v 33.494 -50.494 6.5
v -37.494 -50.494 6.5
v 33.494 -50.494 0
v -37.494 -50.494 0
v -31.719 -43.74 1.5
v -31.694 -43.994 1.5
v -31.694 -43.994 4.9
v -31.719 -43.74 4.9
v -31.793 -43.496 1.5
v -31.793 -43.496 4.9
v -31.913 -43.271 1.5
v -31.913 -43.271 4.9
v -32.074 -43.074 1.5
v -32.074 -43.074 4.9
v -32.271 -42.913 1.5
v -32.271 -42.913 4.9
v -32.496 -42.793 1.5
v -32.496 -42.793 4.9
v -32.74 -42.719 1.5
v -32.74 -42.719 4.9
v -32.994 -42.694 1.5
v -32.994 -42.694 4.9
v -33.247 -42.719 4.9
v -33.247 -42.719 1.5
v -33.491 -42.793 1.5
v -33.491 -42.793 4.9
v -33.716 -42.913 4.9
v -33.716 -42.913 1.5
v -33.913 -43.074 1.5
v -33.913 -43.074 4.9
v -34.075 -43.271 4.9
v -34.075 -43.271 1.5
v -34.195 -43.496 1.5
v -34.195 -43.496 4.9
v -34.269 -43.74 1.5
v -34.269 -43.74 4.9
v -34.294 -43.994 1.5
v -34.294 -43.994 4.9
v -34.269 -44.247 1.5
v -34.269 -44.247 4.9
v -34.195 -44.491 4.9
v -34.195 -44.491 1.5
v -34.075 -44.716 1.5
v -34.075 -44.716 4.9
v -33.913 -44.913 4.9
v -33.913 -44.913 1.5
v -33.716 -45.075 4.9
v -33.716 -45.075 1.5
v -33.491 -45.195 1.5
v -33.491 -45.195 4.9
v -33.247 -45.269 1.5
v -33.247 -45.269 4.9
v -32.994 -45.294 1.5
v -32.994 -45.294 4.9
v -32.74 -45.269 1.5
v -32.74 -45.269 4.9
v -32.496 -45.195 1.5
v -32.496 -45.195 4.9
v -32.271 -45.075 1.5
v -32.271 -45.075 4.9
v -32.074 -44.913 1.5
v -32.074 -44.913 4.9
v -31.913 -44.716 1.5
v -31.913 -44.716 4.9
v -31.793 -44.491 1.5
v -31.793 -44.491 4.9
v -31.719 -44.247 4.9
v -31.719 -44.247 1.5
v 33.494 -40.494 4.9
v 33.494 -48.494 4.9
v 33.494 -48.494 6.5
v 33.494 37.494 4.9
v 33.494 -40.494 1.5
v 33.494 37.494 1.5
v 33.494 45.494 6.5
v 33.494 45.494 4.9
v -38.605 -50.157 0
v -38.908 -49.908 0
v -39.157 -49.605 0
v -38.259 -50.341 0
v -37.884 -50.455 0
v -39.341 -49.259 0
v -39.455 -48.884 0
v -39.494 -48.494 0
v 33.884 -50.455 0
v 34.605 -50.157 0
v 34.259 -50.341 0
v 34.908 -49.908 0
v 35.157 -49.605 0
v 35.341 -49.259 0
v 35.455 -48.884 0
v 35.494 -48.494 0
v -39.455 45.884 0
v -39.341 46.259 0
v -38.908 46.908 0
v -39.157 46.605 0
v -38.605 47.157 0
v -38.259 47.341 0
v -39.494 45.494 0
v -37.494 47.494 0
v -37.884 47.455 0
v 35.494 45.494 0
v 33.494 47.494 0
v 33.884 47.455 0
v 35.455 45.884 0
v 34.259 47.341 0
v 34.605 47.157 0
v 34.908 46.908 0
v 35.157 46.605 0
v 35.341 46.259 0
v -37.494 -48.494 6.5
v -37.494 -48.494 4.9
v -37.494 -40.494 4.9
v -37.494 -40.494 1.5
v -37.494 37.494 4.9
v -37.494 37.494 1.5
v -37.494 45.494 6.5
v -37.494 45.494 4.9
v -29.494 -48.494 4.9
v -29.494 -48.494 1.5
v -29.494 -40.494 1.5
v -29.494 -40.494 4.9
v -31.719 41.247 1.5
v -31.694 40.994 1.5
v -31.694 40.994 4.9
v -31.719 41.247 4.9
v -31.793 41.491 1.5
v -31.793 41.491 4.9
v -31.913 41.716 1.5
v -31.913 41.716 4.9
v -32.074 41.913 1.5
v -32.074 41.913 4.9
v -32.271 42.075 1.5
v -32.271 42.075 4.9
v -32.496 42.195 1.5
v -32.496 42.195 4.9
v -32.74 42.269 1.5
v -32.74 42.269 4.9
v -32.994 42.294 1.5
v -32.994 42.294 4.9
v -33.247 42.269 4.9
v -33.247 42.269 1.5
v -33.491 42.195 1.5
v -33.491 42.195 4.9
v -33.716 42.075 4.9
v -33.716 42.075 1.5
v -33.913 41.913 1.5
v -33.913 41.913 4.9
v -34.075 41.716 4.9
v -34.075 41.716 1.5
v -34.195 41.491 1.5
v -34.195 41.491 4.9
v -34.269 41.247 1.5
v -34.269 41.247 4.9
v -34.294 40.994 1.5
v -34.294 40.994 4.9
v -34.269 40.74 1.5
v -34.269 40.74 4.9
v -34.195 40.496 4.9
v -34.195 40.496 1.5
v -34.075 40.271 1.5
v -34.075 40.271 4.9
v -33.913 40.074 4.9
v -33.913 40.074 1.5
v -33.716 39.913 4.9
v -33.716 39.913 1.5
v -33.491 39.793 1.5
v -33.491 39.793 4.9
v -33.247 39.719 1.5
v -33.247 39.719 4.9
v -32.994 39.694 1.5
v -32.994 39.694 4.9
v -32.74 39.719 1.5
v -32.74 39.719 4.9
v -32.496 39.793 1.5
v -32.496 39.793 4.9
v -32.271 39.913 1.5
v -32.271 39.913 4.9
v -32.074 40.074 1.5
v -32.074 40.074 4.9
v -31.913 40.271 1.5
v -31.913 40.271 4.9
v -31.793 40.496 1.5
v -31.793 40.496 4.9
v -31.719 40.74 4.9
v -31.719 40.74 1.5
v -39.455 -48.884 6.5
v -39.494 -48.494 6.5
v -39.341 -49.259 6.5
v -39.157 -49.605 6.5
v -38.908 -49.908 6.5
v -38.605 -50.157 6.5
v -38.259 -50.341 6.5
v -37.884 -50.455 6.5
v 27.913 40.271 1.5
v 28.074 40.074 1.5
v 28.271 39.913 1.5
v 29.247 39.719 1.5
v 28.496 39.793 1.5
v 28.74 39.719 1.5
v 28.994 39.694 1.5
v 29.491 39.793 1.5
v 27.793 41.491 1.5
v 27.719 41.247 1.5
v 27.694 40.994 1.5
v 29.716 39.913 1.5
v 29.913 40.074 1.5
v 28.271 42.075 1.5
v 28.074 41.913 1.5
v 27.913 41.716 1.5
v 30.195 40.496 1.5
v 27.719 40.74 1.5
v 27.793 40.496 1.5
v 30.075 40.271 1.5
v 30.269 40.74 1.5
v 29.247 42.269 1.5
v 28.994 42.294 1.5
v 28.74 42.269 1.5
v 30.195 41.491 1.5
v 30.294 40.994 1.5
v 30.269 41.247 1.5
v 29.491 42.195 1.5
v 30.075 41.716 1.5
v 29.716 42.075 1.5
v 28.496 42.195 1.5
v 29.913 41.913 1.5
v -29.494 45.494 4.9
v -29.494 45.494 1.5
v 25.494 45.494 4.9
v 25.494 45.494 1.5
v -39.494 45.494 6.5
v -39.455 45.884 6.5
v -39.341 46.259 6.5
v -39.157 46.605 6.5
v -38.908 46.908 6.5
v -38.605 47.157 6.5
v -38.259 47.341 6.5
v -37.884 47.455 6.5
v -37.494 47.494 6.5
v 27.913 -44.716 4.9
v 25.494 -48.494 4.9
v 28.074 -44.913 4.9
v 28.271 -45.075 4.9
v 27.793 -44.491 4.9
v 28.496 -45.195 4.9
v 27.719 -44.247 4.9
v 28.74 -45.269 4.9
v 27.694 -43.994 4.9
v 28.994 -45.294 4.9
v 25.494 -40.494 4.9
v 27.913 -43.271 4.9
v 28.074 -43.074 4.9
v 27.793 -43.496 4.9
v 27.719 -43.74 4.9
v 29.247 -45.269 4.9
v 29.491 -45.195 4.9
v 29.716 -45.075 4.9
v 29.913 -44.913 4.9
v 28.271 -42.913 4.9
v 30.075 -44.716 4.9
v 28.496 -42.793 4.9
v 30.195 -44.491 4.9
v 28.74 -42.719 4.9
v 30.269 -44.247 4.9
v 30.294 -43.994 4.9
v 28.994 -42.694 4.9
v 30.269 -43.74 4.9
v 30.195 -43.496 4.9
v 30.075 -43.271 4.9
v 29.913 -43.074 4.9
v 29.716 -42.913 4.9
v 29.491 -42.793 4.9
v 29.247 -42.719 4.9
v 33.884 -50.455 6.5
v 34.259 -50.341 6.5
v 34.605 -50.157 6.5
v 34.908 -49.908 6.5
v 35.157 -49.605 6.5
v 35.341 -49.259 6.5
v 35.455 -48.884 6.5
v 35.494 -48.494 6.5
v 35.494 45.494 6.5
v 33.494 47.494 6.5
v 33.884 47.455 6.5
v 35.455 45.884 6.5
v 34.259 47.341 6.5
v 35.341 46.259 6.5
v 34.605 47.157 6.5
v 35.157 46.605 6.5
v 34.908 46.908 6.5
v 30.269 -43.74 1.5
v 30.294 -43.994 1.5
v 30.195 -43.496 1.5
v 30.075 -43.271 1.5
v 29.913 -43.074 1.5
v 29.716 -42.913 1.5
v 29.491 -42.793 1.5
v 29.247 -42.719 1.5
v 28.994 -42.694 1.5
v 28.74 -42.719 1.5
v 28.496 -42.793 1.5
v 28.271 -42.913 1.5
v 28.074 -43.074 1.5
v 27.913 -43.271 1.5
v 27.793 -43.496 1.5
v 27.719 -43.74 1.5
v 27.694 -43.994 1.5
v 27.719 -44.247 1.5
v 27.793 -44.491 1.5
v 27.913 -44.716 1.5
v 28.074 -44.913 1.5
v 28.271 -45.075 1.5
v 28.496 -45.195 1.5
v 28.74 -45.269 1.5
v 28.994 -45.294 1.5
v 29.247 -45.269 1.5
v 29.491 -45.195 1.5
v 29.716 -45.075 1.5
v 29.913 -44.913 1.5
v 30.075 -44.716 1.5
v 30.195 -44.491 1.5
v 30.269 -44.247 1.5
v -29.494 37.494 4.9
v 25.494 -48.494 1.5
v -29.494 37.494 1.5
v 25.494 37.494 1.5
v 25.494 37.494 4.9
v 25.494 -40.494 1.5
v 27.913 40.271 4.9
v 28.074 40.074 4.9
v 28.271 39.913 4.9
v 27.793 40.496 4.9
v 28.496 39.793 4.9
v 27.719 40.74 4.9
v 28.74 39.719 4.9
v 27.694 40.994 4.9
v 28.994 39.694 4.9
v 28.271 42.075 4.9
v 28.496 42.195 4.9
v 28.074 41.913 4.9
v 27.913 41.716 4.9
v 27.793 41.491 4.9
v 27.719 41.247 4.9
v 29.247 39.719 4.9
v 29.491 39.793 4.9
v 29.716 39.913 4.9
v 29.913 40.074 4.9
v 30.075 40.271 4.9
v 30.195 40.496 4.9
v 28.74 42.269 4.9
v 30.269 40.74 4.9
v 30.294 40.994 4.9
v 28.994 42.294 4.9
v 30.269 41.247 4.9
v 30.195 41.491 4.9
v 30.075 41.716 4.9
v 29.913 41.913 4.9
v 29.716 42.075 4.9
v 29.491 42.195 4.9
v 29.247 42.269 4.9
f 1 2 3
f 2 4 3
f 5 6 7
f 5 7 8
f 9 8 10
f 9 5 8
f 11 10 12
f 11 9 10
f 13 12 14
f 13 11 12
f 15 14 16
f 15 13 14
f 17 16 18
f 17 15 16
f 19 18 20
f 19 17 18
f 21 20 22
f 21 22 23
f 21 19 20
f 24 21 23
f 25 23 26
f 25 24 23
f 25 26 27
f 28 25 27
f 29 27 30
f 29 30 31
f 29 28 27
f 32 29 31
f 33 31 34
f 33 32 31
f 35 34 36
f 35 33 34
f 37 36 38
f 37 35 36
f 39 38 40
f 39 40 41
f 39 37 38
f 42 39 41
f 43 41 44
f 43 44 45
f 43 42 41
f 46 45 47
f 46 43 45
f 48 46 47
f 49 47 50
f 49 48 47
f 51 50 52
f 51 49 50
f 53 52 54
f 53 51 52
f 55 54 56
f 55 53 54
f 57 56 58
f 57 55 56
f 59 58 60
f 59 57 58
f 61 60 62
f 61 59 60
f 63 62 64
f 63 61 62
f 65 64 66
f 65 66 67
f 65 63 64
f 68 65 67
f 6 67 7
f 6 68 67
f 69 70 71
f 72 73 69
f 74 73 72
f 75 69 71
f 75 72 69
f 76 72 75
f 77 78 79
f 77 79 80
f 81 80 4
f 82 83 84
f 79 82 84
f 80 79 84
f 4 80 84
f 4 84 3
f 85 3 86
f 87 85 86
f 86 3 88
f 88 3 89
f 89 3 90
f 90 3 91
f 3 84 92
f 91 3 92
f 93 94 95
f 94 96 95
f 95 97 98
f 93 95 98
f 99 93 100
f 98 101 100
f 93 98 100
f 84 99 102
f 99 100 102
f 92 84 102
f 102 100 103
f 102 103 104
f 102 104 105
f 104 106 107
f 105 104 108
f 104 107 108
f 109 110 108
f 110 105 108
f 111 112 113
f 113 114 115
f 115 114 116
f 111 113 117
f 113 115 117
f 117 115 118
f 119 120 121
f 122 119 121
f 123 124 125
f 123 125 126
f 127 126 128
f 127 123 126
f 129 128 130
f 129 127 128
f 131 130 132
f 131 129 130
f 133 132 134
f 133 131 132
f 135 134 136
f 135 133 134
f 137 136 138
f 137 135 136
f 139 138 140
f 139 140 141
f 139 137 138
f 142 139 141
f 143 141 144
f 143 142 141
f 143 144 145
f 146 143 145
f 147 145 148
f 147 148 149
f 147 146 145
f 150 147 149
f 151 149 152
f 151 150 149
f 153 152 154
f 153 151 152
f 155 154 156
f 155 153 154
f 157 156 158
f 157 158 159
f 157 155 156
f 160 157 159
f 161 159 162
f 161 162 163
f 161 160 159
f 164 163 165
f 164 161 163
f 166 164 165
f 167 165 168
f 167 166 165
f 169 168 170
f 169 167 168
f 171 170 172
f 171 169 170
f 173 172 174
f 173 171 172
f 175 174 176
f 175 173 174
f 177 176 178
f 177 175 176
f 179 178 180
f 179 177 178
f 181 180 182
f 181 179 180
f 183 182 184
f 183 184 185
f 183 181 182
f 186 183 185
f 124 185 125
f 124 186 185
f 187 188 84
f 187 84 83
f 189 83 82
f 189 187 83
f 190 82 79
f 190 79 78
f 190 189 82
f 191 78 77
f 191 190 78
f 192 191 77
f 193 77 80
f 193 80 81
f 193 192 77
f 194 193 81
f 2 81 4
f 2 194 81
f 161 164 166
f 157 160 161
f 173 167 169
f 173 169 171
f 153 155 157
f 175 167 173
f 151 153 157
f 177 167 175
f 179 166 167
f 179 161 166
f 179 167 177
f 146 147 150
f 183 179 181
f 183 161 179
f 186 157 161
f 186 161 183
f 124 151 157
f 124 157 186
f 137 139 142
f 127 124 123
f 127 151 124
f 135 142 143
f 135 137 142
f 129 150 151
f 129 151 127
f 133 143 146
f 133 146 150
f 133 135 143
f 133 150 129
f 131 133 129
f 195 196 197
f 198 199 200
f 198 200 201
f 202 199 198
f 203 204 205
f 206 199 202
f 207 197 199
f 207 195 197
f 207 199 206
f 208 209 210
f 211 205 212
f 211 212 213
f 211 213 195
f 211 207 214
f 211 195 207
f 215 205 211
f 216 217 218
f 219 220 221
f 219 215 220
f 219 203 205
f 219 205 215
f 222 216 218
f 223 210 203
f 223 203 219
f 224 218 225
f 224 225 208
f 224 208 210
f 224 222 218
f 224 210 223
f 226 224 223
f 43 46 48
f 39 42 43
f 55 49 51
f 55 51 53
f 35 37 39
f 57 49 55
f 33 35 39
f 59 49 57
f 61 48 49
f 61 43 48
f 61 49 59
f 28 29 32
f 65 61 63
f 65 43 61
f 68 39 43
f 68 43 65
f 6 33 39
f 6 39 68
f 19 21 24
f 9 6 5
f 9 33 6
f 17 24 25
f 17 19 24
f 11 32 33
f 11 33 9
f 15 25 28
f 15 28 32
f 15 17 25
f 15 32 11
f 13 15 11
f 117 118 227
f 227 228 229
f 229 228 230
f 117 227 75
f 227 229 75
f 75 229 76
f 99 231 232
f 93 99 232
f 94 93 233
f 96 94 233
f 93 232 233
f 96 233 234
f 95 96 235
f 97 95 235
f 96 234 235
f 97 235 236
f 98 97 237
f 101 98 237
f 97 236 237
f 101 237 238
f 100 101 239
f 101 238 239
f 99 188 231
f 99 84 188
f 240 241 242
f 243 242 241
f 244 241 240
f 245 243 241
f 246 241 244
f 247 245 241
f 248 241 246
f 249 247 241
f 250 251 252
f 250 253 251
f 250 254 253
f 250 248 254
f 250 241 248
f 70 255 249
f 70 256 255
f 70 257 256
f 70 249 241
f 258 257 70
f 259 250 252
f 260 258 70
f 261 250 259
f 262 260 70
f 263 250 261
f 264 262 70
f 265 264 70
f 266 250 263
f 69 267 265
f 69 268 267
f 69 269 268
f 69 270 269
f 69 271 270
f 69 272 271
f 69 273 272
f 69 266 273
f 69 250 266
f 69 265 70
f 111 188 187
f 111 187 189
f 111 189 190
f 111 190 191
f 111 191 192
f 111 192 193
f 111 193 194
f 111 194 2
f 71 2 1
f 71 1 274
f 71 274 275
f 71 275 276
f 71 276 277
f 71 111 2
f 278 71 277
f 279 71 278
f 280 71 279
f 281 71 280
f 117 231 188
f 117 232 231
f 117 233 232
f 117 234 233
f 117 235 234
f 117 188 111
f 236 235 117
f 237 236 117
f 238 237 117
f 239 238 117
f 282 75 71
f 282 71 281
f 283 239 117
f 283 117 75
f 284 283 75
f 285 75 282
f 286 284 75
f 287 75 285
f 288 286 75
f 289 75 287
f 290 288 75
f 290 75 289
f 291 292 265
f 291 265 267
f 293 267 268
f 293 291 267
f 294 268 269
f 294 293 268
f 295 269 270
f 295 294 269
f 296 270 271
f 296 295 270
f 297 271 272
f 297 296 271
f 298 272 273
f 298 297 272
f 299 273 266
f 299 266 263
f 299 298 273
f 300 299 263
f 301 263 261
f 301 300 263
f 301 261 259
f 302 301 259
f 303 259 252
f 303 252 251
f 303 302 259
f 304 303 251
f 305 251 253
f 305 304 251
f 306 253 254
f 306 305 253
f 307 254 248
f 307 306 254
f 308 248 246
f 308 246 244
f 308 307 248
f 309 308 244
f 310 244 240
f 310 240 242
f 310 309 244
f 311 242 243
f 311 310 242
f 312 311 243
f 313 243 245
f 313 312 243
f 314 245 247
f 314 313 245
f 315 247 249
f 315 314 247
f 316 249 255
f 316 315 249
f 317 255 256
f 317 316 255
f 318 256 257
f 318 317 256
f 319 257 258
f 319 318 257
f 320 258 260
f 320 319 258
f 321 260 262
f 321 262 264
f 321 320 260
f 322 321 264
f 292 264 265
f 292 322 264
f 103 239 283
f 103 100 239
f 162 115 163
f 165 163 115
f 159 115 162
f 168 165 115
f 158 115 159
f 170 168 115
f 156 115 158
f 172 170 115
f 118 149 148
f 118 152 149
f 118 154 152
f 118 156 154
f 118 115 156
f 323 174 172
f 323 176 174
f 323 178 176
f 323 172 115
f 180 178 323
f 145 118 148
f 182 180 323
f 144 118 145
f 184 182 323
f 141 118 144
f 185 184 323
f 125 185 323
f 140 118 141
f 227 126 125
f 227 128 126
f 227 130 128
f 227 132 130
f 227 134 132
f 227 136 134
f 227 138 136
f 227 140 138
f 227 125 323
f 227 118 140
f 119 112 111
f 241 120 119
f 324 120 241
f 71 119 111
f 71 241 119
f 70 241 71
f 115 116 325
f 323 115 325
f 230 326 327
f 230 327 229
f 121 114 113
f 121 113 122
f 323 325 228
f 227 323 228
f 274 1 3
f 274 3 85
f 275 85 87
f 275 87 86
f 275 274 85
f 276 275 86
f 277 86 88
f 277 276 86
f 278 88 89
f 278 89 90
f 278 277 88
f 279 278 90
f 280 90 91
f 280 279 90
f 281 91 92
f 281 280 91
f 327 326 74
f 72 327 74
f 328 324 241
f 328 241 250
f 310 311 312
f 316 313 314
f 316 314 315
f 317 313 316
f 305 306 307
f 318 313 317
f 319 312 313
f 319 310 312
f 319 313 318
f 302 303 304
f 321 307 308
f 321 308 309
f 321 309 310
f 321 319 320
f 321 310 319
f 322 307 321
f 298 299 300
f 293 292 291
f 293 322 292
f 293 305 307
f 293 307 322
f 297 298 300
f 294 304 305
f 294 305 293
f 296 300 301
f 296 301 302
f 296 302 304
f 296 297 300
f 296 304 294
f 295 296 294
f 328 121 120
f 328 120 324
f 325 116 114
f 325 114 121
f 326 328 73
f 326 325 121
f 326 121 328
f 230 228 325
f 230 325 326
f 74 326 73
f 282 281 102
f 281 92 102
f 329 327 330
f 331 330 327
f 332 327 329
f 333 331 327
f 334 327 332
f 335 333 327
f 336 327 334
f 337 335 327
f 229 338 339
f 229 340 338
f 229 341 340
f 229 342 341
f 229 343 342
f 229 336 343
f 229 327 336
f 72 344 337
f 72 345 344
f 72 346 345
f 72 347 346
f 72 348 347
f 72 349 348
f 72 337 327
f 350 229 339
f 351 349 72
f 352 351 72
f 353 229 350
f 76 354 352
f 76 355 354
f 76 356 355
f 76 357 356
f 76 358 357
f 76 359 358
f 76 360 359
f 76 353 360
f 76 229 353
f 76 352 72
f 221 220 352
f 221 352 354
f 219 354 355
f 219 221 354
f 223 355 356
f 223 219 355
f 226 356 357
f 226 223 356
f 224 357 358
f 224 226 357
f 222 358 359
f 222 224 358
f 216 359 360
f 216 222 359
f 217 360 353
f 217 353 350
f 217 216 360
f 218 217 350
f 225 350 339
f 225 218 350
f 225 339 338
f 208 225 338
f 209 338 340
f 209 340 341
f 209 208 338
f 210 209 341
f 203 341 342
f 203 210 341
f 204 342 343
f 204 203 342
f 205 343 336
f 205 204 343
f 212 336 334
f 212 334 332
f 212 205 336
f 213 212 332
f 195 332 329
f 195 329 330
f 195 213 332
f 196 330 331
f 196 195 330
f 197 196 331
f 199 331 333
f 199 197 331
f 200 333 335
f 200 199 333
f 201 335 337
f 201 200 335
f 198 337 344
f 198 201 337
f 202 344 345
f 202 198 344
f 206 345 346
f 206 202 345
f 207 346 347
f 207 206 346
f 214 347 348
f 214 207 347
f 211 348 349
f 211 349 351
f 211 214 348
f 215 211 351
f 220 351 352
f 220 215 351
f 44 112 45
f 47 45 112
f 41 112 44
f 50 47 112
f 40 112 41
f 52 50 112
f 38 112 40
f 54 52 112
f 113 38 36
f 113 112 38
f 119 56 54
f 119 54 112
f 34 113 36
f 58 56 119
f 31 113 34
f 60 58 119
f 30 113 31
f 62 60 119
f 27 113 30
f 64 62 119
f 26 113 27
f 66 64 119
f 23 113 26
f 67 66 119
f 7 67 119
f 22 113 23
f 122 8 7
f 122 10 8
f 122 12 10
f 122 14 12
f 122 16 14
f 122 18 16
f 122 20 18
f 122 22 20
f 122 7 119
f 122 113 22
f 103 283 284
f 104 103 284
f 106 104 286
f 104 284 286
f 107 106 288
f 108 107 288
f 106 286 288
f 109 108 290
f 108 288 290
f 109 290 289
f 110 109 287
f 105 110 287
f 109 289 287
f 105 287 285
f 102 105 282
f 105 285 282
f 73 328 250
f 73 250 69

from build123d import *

# Parameters (mm, degrees)
F1_DEPTH = 1.5
F2_W     = 74.9872508645
F2_H     = 97.9872508645
F2_W_2   = 70.9872508645
F2_H_2   = 93.9872508645
F3_DEPTH = 5
F4_W     = 8
F4_H     = 8
F4_R     = 1.3
F5_DEPTH = 3.4
F6_R     = 2


with BuildPart() as f1:
    # F0 (on Top) → F1 (new body)
    with BuildSketch(Plane.XY):
        Polygon((-39.4936254323, -50.4936254323), (-37, -50.4936254323), (33, -50.4936254323), (35.4936254323, -50.4936254323), (35.4936254323, -48), (35.4936254323, 45), (35.4936254323, 47.4936254323), (33, 47.4936254323), (-37, 47.4936254323), (-39.4936254323, 47.4936254323), (-39.4936254323, -47.5), align=None)
    extrude(amount=F1_DEPTH)

    # F2 (on face) → F3 (join)
    with BuildSketch(Plane.XY.offset(1.5)):
        with Locations((-2, -1.5)):
            Rectangle(F2_W, F2_H)
        with Locations((-2, -1.5)):
            Rectangle(F2_W_2, F2_H_2, mode=Mode.SUBTRACT)
    extrude(amount=F3_DEPTH)

    # F4 (on face) → F5 (join)
    with BuildSketch(Plane.XY.offset(1.5)):
        with Locations((-33.4936254323, 41.4936254323)):
            Rectangle(F4_W, F4_H)
        with Locations((-32.9936254323, 40.9936254323)):
            Circle(F4_R, mode=Mode.SUBTRACT)
        with Locations((29.4936254323, 41.4936254323)):
            Rectangle(F4_W, F4_H)
        with Locations((28.9936254323, 40.9936254323)):
            Circle(F4_R, mode=Mode.SUBTRACT)
        with Locations((29.4936254323, -44.4936254323)):
            Rectangle(F4_W, F4_H)
        with Locations((28.9936254323, -43.9936254323)):
            Circle(F4_R, mode=Mode.SUBTRACT)
        with Locations((-33.4936254323, -44.4936254323)):
            Rectangle(F4_W, F4_H)
        with Locations((-32.9936254323, -43.9936254323)):
            Circle(F4_R, mode=Mode.SUBTRACT)
    extrude(amount=F5_DEPTH)

    # F6
    f6_edges = [f1.edges().sort_by_distance(p)[0] for p in [
        (-39.493625, -50.493625, 3.25),
        (-39.493625, 47.493625, 3.25),
        (35.493625, 47.493625, 3.25),
        (35.493625, -50.493625, 3.25),
    ]]
    fillet(f6_edges, radius=F6_R)


solid = f1.part
